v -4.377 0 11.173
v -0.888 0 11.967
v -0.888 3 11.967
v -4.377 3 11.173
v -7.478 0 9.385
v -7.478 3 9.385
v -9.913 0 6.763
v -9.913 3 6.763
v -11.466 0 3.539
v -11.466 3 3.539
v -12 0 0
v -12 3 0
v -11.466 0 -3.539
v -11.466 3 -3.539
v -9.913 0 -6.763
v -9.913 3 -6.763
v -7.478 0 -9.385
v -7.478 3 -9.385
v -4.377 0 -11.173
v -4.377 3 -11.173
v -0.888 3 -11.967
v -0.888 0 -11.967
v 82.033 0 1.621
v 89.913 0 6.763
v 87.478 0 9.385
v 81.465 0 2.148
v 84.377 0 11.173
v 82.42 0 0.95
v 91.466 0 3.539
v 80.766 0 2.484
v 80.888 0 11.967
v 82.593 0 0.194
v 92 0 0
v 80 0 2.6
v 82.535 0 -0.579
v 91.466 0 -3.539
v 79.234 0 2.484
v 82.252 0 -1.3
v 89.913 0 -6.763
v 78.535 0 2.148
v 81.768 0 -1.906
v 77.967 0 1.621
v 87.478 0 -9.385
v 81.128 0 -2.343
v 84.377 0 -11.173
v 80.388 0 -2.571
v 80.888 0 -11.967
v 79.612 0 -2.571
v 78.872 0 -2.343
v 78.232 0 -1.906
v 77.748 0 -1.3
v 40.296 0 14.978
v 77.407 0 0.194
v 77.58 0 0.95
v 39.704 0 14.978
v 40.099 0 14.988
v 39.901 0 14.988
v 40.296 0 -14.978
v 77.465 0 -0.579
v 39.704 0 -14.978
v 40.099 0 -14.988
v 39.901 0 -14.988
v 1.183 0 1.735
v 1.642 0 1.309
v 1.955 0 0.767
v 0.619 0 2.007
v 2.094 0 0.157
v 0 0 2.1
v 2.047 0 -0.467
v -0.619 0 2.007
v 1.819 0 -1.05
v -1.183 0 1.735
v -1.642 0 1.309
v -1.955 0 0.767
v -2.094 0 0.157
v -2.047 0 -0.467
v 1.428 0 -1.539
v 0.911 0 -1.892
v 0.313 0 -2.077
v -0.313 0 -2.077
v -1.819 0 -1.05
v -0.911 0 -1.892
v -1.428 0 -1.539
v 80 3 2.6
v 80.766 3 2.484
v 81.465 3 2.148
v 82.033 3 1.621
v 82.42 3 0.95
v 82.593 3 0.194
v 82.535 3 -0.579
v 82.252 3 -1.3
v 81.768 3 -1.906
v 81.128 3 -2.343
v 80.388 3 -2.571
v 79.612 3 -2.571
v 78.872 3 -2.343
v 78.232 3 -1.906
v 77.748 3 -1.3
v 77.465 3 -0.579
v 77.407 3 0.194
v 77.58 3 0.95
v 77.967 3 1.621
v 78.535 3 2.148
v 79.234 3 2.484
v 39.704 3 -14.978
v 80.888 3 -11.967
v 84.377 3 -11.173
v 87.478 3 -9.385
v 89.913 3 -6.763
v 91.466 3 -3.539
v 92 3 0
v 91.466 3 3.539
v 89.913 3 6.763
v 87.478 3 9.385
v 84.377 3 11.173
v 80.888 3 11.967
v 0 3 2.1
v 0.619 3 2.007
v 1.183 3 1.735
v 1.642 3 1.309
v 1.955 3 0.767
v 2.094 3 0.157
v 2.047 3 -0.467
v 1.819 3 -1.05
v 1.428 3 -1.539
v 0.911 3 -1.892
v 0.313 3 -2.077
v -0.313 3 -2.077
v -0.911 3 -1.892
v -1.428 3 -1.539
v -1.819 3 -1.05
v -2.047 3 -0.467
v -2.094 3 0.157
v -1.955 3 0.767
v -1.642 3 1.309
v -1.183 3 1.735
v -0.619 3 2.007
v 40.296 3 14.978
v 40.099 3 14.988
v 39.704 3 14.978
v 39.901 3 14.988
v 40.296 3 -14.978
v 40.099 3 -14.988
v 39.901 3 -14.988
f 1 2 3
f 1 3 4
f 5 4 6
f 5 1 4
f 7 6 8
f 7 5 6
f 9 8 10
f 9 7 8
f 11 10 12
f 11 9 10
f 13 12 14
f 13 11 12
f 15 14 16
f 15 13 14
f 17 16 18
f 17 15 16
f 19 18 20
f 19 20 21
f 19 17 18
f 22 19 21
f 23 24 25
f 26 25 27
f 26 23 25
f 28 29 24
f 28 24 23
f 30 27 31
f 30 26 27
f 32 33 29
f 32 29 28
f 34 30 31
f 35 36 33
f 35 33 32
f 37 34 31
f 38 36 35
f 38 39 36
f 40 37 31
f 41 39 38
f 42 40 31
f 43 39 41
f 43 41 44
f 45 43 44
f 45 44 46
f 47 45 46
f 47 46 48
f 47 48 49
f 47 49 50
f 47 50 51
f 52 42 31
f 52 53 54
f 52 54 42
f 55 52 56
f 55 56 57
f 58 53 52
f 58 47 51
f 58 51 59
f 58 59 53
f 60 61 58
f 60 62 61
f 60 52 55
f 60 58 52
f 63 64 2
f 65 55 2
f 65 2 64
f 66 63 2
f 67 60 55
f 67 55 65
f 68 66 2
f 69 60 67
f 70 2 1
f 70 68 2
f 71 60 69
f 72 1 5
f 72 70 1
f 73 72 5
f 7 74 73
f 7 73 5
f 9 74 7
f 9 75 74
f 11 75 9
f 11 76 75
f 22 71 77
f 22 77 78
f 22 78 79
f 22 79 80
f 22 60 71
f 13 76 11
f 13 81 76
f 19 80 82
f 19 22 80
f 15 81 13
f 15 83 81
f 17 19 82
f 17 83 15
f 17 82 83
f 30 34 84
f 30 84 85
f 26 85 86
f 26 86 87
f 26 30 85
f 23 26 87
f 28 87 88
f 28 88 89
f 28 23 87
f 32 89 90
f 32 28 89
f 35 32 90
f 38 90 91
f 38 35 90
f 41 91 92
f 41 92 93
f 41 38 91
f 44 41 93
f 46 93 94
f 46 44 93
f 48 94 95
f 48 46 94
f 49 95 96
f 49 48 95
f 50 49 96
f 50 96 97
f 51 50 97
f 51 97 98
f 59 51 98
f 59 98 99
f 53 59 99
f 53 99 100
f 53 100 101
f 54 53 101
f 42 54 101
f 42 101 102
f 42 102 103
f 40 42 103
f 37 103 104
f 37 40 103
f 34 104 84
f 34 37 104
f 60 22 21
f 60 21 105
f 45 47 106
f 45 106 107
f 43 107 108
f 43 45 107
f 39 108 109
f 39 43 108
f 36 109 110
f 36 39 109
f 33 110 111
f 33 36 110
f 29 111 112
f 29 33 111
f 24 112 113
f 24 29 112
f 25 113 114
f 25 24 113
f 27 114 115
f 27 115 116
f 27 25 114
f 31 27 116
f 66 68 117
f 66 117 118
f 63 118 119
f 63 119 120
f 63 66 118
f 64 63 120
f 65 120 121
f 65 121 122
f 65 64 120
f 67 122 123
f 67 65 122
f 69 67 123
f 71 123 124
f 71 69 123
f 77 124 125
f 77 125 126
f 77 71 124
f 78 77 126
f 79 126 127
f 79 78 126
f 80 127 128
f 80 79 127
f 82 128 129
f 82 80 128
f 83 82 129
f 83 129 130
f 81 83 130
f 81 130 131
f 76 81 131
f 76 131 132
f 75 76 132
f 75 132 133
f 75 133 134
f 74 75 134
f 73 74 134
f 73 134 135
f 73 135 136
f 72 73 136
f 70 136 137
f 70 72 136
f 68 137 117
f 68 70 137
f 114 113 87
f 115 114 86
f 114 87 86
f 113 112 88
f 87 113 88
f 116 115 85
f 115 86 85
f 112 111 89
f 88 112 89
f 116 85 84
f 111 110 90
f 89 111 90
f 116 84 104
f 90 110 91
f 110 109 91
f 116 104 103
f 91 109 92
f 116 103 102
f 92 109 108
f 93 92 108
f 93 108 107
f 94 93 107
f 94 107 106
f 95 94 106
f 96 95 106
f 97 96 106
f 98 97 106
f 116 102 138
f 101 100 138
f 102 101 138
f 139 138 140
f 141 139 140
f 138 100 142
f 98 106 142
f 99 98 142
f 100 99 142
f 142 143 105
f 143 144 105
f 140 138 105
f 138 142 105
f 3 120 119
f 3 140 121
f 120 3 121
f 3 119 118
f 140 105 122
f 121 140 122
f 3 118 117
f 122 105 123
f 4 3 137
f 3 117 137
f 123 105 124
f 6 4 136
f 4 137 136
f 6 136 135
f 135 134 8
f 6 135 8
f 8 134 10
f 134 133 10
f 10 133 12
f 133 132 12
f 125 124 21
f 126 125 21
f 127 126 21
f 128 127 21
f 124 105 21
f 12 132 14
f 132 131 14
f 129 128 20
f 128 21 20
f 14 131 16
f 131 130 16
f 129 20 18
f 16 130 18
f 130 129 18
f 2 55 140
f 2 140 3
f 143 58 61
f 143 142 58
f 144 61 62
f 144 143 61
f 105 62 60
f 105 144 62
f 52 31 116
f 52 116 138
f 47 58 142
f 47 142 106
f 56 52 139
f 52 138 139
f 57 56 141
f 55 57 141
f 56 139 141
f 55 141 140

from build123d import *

# Parameters (mm, degrees)
SKETCH_1_R      = 2.1
SKETCH_1_R_2    = 2.6
EXTRUDE_1_DEPTH = 3
FILLET_1_R      = 4


with BuildPart() as part:
    # 草图1 → 凸台-拉伸1 (new body)
    with BuildSketch(Plane(origin=(0, 0, 0), x_dir=(1, 0, 0), z_dir=(0, 1, 0))):
        with BuildLine():
            Line((40, 15), (80.887671233, 11.967123288))
            ThreePointArc((80.887671233, 11.967123288), (92, 0), (80.887671233, -11.967123288))
            Line((80.887671233, -11.967123288), (40, -15))
            Line((40, -15), (-0.887671233, -11.967123288))
            ThreePointArc((-0.887671233, -11.967123288), (-12, 0), (-0.887671233, 11.967123288))
            Line((-0.887671233, 11.967123288), (40, 15))
        make_face()
        with Locations(Location((0, 0, 0), (0, 0, 270))):
            Circle(SKETCH_1_R, mode=Mode.SUBTRACT)
        with Locations(Location((80, 0, 0), (0, 0, 270))):
            Circle(SKETCH_1_R_2, mode=Mode.SUBTRACT)
    extrude(amount=EXTRUDE_1_DEPTH)

    # 圆角1
    fillet_1_edges = [part.edges().sort_by_distance(p)[0] for p in [
        (40, 1.5, -15),
        (40, 1.5, 15),
    ]]
    fillet(fillet_1_edges, radius=FILLET_1_R)


solid = part.part
